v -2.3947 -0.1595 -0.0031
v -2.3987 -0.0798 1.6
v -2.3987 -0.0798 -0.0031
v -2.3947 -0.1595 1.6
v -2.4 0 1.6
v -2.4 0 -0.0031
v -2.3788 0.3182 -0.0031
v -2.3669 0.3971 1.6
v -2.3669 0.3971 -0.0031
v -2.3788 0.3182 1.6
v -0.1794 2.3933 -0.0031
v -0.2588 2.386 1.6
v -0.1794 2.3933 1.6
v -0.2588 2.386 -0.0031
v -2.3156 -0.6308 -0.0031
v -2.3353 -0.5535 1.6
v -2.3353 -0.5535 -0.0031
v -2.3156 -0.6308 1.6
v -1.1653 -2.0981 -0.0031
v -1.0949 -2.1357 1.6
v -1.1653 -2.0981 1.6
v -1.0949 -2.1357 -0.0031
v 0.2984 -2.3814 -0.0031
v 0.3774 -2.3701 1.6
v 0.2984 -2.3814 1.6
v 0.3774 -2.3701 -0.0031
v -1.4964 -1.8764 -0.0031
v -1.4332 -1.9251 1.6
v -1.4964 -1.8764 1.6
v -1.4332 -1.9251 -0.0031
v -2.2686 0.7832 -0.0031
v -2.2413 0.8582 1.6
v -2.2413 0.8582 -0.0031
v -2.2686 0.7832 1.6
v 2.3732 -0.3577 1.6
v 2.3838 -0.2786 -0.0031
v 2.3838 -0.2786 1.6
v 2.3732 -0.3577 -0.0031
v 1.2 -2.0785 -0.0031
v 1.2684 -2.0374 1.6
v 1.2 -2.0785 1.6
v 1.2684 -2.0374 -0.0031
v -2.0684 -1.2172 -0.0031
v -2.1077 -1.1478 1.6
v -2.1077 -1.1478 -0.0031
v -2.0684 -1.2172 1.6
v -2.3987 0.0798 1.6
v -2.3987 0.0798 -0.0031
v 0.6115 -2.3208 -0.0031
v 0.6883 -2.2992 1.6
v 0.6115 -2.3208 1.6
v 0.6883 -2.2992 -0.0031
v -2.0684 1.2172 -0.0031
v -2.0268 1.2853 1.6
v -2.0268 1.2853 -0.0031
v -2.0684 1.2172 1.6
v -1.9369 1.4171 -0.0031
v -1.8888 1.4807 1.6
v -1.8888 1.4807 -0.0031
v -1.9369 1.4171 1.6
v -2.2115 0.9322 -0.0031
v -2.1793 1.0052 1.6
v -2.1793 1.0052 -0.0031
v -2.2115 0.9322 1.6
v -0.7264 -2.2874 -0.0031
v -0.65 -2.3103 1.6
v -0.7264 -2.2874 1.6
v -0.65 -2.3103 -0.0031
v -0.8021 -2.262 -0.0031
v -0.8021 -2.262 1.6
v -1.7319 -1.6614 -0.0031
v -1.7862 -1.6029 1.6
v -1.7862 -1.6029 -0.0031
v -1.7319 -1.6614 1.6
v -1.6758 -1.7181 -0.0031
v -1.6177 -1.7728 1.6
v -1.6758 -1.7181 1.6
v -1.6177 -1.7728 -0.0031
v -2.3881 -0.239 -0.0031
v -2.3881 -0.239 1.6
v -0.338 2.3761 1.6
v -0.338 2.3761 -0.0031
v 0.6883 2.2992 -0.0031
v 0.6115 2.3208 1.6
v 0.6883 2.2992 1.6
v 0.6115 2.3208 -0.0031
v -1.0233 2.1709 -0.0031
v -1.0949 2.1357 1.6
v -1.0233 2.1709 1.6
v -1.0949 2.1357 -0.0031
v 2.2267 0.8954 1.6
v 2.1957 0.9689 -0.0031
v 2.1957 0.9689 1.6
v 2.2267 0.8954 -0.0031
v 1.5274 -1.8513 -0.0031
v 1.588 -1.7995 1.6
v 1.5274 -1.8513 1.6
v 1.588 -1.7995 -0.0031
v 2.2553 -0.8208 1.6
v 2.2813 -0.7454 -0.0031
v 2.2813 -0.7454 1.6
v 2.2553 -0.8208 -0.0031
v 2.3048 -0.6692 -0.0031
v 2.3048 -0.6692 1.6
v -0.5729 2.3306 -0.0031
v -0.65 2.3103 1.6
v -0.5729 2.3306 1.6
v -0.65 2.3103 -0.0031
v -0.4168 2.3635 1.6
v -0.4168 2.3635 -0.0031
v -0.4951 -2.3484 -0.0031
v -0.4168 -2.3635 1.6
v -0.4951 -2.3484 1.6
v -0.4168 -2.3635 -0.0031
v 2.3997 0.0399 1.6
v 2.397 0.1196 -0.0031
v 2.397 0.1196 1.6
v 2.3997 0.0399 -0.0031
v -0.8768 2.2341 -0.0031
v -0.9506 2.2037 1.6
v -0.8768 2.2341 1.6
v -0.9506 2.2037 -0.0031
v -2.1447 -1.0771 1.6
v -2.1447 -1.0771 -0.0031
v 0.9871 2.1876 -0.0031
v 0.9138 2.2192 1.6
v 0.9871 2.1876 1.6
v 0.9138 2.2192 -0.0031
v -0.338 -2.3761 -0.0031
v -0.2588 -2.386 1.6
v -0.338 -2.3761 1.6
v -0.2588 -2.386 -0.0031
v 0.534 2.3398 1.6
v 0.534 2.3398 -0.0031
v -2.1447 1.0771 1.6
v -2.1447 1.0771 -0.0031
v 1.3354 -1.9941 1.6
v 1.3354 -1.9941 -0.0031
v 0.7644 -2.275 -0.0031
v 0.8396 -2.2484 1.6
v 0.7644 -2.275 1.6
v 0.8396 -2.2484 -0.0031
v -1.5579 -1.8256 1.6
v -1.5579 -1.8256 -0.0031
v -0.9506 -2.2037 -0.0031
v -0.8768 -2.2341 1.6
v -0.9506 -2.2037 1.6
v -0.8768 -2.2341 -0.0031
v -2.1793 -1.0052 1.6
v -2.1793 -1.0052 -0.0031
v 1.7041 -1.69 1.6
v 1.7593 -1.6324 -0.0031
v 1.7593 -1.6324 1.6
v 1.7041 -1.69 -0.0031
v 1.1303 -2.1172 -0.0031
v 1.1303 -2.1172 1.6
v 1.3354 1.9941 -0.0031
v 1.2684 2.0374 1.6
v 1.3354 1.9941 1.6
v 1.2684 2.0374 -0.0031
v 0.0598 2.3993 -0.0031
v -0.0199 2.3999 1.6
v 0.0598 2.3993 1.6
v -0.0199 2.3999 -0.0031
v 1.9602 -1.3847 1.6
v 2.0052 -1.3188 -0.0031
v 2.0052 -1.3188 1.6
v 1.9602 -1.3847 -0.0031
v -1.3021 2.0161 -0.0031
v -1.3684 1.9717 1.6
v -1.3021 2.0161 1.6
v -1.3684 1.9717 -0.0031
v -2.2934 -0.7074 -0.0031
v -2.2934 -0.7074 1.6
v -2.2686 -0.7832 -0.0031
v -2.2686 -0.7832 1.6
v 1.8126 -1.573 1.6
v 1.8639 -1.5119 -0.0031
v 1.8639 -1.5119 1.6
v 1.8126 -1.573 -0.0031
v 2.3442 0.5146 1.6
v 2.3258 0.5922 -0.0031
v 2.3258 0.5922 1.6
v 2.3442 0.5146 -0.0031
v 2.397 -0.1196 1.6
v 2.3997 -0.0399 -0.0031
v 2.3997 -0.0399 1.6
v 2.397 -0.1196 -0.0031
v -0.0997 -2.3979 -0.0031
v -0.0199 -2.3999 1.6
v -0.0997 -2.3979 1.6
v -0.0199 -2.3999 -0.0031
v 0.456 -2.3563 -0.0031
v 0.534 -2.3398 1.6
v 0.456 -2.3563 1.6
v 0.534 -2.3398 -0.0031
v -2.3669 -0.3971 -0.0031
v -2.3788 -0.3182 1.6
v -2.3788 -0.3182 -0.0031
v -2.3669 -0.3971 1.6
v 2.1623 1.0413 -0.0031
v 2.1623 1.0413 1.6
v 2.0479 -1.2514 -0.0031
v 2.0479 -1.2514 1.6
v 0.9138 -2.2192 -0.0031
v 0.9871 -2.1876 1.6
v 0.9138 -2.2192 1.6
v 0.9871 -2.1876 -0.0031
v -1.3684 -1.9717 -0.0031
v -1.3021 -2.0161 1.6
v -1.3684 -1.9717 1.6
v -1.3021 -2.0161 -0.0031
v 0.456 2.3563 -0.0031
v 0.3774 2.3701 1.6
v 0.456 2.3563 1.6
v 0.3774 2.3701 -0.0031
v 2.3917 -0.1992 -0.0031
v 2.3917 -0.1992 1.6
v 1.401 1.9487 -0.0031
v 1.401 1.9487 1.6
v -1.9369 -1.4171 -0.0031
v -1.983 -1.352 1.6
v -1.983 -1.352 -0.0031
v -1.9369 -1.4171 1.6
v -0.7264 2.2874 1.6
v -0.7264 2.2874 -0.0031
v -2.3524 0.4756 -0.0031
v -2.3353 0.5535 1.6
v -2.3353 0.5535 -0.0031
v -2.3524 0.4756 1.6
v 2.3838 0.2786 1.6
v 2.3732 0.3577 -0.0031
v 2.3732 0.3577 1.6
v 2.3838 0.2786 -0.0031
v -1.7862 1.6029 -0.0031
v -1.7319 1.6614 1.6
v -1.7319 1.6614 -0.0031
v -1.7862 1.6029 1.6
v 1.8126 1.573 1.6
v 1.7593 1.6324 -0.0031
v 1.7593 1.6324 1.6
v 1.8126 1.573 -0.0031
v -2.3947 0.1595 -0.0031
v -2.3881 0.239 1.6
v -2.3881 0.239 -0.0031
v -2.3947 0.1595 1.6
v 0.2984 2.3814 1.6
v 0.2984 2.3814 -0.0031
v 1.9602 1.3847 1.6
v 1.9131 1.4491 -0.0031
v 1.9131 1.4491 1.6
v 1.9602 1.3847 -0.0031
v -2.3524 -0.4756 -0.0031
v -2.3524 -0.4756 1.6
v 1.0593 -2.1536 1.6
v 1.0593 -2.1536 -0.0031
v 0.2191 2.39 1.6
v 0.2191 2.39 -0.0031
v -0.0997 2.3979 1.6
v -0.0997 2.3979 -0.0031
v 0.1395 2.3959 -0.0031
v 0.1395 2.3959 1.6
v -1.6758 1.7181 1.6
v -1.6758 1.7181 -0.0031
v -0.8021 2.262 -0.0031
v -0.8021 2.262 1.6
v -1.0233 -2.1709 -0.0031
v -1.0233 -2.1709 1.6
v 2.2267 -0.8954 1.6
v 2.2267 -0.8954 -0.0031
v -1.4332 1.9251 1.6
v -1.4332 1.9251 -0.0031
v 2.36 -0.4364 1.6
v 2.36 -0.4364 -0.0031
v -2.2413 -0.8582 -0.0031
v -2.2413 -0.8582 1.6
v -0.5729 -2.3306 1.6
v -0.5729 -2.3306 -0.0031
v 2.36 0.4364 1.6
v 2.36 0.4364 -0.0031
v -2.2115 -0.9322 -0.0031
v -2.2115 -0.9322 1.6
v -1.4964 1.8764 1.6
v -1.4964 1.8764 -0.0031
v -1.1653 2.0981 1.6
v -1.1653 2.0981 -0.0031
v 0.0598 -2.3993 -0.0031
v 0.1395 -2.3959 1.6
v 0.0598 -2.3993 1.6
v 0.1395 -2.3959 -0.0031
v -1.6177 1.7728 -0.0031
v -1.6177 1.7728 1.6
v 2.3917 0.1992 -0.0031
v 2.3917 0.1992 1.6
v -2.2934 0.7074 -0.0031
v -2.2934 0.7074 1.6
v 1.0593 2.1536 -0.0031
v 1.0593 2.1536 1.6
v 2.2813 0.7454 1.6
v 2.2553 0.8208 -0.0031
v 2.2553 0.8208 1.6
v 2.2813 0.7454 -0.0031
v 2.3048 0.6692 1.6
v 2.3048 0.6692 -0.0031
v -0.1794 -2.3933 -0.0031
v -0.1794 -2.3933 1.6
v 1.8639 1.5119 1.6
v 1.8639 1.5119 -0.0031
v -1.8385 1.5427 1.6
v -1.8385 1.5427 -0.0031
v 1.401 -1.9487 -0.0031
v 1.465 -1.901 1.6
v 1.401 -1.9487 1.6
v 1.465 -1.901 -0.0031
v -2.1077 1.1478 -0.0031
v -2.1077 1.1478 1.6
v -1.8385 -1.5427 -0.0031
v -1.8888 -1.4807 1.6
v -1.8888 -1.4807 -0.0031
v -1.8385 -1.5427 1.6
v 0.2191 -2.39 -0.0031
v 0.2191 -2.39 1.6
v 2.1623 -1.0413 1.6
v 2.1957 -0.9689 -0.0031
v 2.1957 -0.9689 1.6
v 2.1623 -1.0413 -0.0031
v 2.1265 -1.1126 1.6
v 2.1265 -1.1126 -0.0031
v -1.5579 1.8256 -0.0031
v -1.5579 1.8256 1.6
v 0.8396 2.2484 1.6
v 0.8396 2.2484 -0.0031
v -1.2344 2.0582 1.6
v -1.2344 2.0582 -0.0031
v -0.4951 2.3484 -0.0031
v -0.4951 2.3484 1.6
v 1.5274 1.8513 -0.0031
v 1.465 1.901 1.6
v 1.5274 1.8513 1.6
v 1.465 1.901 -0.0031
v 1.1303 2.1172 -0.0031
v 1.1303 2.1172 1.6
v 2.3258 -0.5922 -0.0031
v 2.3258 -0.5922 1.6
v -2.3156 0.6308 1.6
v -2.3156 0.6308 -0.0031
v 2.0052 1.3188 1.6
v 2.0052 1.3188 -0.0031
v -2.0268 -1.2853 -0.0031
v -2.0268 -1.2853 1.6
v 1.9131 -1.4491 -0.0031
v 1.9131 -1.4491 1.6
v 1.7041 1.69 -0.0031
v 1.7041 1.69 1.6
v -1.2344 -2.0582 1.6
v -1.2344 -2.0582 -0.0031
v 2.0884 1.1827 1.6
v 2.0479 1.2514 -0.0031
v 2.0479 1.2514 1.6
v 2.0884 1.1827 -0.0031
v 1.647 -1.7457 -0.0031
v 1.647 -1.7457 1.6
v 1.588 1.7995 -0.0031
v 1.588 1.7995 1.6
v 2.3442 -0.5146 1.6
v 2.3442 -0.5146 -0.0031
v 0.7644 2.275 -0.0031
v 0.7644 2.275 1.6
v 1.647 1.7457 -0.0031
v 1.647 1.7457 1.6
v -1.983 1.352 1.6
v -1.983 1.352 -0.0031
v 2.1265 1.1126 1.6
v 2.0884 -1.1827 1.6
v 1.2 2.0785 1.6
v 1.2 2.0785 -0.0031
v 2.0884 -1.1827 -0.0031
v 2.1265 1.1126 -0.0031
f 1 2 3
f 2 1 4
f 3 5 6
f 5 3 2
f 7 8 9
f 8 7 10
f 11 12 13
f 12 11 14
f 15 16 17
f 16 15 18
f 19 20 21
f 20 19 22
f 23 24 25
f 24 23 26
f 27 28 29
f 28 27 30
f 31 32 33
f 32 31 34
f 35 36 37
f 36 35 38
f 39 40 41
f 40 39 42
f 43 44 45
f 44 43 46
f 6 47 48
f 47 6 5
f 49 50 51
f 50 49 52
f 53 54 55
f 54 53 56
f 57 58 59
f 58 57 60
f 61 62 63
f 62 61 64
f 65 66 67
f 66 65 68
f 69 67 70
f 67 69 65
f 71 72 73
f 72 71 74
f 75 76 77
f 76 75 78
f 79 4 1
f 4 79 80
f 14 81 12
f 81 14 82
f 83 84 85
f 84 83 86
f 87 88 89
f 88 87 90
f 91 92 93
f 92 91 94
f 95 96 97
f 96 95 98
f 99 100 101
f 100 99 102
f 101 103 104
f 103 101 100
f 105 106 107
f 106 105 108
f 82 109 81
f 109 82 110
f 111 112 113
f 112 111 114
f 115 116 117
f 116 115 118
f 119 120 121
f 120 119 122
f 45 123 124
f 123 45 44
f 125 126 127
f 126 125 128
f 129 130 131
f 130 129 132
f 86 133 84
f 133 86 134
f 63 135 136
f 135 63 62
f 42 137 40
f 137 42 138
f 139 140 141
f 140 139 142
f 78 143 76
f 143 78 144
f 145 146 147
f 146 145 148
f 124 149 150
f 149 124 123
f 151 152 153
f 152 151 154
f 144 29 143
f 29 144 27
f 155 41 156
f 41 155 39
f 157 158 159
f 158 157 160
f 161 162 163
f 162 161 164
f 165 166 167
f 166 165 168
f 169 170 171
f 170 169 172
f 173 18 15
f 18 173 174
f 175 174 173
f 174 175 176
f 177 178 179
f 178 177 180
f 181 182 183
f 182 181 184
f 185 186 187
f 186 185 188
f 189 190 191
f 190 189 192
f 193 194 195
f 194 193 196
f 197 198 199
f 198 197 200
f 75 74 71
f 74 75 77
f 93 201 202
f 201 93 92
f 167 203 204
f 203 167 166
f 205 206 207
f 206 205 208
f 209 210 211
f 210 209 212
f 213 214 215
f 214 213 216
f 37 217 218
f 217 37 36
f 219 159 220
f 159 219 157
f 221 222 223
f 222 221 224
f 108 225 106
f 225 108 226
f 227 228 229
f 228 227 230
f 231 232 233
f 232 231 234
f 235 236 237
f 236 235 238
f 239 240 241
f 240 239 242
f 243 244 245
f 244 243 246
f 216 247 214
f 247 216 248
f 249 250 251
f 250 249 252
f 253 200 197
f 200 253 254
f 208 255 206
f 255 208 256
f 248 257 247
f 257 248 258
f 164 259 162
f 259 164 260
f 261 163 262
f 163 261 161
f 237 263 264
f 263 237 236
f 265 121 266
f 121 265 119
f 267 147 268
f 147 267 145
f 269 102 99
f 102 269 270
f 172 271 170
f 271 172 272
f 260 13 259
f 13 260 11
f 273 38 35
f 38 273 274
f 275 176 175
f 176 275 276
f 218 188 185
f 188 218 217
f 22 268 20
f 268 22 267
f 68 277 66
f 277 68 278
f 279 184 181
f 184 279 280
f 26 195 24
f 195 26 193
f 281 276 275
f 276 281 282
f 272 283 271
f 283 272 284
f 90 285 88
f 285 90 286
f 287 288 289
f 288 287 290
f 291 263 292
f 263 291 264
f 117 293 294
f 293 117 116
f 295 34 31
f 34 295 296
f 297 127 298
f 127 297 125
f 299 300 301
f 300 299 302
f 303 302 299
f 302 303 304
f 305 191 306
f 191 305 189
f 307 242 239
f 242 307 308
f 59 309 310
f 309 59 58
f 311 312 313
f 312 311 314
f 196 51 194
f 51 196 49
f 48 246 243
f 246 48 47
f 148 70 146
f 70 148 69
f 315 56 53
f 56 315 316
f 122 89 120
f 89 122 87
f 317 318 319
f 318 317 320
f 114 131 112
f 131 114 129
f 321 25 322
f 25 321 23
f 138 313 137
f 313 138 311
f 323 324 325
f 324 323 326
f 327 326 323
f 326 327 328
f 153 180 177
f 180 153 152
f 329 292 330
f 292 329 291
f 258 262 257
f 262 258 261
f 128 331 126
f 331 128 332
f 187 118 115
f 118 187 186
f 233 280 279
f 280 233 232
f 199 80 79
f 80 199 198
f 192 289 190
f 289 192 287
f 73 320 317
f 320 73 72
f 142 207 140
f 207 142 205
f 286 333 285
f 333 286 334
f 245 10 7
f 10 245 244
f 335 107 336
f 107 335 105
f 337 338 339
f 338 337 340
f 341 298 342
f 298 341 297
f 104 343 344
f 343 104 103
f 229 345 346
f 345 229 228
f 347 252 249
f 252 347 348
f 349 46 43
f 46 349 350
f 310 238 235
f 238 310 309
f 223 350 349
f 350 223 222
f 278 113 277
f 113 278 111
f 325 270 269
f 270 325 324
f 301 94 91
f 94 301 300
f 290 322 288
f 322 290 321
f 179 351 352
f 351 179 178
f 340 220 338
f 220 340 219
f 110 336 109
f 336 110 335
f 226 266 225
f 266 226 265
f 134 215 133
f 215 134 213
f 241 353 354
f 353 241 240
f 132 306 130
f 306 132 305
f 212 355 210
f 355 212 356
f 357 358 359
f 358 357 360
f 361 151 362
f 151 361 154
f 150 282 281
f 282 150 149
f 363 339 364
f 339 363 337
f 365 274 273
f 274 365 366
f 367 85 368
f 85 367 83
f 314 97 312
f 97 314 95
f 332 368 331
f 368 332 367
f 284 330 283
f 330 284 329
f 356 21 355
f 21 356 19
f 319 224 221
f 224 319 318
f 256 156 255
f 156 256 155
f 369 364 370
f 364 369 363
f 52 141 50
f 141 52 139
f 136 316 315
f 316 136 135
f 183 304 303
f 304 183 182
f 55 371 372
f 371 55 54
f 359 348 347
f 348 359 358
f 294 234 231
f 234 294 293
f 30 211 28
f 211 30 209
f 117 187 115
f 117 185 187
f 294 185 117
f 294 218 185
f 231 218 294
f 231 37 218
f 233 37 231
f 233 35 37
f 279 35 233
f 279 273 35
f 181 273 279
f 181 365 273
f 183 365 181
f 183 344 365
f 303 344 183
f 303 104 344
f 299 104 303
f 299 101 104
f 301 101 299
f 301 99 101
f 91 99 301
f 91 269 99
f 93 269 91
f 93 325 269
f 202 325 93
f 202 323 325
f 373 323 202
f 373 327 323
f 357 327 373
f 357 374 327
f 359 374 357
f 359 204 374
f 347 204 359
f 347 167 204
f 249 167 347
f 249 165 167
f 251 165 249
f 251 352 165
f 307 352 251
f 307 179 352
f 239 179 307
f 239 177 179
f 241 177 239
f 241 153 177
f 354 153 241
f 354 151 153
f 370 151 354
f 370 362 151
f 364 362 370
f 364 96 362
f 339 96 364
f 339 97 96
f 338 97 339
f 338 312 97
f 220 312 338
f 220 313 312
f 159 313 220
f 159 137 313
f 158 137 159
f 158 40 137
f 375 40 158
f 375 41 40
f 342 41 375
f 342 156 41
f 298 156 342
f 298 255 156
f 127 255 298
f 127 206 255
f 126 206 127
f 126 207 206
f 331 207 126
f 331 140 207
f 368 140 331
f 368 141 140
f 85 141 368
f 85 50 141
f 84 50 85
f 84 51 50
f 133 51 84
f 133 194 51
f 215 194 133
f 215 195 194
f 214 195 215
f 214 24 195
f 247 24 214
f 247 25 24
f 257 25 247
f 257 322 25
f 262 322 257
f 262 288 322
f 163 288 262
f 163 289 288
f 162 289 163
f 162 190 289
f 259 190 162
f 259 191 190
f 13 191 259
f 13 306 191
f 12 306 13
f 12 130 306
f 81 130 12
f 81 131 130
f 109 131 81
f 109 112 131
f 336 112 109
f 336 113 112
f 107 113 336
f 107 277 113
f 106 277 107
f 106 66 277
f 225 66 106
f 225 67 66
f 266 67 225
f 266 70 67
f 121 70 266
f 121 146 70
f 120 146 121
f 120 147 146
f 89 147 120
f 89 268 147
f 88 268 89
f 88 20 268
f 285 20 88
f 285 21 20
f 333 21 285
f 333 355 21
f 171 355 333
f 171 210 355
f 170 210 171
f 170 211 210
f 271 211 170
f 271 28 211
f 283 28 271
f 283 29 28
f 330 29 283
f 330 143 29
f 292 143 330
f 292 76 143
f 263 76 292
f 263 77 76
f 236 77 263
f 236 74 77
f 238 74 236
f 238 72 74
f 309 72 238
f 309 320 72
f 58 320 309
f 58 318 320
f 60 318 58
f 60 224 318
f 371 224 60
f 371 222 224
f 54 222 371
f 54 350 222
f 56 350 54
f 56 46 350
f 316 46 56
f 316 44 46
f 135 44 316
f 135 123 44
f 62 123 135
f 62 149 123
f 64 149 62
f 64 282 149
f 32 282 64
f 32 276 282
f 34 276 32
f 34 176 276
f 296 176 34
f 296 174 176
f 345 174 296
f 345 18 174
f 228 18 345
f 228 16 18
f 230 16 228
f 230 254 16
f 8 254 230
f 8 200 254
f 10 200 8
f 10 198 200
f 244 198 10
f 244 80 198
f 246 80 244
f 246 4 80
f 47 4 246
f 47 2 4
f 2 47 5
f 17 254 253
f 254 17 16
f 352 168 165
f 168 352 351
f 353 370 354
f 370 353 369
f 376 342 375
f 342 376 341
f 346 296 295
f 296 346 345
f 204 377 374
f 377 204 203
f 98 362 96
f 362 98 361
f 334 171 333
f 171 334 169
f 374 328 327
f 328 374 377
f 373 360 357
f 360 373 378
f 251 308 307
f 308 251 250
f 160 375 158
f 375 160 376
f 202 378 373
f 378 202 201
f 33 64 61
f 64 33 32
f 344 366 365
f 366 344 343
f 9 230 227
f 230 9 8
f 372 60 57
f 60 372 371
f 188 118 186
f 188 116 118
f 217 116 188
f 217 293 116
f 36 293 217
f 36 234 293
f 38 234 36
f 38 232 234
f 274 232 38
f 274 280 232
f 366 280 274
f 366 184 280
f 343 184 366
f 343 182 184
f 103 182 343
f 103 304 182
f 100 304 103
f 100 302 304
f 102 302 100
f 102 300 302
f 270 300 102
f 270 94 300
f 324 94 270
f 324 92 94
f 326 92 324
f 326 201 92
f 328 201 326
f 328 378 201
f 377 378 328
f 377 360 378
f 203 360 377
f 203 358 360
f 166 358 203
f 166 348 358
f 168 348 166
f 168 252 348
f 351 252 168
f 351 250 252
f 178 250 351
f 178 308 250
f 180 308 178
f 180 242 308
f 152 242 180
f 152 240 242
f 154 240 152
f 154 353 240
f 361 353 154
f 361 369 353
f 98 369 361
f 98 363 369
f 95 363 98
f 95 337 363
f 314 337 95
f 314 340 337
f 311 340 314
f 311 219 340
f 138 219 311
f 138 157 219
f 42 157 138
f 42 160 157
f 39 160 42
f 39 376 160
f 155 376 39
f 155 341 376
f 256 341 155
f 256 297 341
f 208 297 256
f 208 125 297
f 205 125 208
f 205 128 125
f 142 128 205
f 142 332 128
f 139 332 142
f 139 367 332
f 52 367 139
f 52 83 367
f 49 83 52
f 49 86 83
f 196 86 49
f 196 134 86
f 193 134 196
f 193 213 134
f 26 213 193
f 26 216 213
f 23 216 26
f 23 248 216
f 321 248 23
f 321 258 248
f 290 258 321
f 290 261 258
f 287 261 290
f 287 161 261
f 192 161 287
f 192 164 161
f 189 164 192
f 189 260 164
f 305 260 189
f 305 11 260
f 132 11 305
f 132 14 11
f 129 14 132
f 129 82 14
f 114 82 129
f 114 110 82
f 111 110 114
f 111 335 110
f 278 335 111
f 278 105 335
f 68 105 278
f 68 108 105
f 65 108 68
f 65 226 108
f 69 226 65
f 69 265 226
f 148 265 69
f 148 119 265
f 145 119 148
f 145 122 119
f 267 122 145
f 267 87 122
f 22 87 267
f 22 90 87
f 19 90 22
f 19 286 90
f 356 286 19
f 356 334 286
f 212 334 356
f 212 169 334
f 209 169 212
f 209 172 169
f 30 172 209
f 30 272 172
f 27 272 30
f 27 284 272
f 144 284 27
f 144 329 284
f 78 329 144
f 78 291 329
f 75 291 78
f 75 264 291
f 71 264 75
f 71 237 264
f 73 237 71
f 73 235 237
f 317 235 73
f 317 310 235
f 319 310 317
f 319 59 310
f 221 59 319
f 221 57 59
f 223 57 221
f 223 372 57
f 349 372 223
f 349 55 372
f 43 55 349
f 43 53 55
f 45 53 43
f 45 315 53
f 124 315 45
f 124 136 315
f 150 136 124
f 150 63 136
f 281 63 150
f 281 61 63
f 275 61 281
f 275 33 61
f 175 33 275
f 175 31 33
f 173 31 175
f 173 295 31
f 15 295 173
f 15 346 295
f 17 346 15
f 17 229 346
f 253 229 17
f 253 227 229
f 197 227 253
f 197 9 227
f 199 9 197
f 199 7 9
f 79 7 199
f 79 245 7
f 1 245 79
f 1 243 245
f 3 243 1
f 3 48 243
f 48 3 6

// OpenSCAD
use <../lib.scad>
use <2921.scad>
$fa=1; $fs=0.2;
function ldraw_lib__2872(realsolid=false) = [
// 0 ~Moved to 2921
// 0 Name: 2872.dat
// 0 Author: [PTadmin]
// 0 !LDRAW_ORG Part UPDATE 1998-07
// 0 !LICENSE Licensed under CC BY 4.0 : see CAreadme.txt
// 
// 0 BFC CERTIFY CCW
  [0,"BFC","CERTIFY"],
  [0,"BFC","CCW"],
// 
// 0 !HISTORY 1998-07-15 [PTadmin] Official Update 1998-07
// 0 !HISTORY 2007-05-20 [PTadmin] Header formatted for Contributor Agreement
// 0 !HISTORY 2008-07-01 [PTadmin] Official Update 2008-01
// 
// 
// 1 16 0 0 0 1 0 0 0 1 0 0 0 1 2921.dat
  [1,16,0,0,0,1,0,0,0,1,0,0,0,1, ldraw_lib__2921(realsolid)],
];
module ldraw_lib__2872(step=0, col=false, unit=2/5, alt=false, line=0.2, solid=!$preview)
    makepoly(ldraw_lib__2872(solid), step=step, col=col, unit=unit, alt=alt, line=line, solid=solid);
ldraw_lib__2872(line=0.2);
